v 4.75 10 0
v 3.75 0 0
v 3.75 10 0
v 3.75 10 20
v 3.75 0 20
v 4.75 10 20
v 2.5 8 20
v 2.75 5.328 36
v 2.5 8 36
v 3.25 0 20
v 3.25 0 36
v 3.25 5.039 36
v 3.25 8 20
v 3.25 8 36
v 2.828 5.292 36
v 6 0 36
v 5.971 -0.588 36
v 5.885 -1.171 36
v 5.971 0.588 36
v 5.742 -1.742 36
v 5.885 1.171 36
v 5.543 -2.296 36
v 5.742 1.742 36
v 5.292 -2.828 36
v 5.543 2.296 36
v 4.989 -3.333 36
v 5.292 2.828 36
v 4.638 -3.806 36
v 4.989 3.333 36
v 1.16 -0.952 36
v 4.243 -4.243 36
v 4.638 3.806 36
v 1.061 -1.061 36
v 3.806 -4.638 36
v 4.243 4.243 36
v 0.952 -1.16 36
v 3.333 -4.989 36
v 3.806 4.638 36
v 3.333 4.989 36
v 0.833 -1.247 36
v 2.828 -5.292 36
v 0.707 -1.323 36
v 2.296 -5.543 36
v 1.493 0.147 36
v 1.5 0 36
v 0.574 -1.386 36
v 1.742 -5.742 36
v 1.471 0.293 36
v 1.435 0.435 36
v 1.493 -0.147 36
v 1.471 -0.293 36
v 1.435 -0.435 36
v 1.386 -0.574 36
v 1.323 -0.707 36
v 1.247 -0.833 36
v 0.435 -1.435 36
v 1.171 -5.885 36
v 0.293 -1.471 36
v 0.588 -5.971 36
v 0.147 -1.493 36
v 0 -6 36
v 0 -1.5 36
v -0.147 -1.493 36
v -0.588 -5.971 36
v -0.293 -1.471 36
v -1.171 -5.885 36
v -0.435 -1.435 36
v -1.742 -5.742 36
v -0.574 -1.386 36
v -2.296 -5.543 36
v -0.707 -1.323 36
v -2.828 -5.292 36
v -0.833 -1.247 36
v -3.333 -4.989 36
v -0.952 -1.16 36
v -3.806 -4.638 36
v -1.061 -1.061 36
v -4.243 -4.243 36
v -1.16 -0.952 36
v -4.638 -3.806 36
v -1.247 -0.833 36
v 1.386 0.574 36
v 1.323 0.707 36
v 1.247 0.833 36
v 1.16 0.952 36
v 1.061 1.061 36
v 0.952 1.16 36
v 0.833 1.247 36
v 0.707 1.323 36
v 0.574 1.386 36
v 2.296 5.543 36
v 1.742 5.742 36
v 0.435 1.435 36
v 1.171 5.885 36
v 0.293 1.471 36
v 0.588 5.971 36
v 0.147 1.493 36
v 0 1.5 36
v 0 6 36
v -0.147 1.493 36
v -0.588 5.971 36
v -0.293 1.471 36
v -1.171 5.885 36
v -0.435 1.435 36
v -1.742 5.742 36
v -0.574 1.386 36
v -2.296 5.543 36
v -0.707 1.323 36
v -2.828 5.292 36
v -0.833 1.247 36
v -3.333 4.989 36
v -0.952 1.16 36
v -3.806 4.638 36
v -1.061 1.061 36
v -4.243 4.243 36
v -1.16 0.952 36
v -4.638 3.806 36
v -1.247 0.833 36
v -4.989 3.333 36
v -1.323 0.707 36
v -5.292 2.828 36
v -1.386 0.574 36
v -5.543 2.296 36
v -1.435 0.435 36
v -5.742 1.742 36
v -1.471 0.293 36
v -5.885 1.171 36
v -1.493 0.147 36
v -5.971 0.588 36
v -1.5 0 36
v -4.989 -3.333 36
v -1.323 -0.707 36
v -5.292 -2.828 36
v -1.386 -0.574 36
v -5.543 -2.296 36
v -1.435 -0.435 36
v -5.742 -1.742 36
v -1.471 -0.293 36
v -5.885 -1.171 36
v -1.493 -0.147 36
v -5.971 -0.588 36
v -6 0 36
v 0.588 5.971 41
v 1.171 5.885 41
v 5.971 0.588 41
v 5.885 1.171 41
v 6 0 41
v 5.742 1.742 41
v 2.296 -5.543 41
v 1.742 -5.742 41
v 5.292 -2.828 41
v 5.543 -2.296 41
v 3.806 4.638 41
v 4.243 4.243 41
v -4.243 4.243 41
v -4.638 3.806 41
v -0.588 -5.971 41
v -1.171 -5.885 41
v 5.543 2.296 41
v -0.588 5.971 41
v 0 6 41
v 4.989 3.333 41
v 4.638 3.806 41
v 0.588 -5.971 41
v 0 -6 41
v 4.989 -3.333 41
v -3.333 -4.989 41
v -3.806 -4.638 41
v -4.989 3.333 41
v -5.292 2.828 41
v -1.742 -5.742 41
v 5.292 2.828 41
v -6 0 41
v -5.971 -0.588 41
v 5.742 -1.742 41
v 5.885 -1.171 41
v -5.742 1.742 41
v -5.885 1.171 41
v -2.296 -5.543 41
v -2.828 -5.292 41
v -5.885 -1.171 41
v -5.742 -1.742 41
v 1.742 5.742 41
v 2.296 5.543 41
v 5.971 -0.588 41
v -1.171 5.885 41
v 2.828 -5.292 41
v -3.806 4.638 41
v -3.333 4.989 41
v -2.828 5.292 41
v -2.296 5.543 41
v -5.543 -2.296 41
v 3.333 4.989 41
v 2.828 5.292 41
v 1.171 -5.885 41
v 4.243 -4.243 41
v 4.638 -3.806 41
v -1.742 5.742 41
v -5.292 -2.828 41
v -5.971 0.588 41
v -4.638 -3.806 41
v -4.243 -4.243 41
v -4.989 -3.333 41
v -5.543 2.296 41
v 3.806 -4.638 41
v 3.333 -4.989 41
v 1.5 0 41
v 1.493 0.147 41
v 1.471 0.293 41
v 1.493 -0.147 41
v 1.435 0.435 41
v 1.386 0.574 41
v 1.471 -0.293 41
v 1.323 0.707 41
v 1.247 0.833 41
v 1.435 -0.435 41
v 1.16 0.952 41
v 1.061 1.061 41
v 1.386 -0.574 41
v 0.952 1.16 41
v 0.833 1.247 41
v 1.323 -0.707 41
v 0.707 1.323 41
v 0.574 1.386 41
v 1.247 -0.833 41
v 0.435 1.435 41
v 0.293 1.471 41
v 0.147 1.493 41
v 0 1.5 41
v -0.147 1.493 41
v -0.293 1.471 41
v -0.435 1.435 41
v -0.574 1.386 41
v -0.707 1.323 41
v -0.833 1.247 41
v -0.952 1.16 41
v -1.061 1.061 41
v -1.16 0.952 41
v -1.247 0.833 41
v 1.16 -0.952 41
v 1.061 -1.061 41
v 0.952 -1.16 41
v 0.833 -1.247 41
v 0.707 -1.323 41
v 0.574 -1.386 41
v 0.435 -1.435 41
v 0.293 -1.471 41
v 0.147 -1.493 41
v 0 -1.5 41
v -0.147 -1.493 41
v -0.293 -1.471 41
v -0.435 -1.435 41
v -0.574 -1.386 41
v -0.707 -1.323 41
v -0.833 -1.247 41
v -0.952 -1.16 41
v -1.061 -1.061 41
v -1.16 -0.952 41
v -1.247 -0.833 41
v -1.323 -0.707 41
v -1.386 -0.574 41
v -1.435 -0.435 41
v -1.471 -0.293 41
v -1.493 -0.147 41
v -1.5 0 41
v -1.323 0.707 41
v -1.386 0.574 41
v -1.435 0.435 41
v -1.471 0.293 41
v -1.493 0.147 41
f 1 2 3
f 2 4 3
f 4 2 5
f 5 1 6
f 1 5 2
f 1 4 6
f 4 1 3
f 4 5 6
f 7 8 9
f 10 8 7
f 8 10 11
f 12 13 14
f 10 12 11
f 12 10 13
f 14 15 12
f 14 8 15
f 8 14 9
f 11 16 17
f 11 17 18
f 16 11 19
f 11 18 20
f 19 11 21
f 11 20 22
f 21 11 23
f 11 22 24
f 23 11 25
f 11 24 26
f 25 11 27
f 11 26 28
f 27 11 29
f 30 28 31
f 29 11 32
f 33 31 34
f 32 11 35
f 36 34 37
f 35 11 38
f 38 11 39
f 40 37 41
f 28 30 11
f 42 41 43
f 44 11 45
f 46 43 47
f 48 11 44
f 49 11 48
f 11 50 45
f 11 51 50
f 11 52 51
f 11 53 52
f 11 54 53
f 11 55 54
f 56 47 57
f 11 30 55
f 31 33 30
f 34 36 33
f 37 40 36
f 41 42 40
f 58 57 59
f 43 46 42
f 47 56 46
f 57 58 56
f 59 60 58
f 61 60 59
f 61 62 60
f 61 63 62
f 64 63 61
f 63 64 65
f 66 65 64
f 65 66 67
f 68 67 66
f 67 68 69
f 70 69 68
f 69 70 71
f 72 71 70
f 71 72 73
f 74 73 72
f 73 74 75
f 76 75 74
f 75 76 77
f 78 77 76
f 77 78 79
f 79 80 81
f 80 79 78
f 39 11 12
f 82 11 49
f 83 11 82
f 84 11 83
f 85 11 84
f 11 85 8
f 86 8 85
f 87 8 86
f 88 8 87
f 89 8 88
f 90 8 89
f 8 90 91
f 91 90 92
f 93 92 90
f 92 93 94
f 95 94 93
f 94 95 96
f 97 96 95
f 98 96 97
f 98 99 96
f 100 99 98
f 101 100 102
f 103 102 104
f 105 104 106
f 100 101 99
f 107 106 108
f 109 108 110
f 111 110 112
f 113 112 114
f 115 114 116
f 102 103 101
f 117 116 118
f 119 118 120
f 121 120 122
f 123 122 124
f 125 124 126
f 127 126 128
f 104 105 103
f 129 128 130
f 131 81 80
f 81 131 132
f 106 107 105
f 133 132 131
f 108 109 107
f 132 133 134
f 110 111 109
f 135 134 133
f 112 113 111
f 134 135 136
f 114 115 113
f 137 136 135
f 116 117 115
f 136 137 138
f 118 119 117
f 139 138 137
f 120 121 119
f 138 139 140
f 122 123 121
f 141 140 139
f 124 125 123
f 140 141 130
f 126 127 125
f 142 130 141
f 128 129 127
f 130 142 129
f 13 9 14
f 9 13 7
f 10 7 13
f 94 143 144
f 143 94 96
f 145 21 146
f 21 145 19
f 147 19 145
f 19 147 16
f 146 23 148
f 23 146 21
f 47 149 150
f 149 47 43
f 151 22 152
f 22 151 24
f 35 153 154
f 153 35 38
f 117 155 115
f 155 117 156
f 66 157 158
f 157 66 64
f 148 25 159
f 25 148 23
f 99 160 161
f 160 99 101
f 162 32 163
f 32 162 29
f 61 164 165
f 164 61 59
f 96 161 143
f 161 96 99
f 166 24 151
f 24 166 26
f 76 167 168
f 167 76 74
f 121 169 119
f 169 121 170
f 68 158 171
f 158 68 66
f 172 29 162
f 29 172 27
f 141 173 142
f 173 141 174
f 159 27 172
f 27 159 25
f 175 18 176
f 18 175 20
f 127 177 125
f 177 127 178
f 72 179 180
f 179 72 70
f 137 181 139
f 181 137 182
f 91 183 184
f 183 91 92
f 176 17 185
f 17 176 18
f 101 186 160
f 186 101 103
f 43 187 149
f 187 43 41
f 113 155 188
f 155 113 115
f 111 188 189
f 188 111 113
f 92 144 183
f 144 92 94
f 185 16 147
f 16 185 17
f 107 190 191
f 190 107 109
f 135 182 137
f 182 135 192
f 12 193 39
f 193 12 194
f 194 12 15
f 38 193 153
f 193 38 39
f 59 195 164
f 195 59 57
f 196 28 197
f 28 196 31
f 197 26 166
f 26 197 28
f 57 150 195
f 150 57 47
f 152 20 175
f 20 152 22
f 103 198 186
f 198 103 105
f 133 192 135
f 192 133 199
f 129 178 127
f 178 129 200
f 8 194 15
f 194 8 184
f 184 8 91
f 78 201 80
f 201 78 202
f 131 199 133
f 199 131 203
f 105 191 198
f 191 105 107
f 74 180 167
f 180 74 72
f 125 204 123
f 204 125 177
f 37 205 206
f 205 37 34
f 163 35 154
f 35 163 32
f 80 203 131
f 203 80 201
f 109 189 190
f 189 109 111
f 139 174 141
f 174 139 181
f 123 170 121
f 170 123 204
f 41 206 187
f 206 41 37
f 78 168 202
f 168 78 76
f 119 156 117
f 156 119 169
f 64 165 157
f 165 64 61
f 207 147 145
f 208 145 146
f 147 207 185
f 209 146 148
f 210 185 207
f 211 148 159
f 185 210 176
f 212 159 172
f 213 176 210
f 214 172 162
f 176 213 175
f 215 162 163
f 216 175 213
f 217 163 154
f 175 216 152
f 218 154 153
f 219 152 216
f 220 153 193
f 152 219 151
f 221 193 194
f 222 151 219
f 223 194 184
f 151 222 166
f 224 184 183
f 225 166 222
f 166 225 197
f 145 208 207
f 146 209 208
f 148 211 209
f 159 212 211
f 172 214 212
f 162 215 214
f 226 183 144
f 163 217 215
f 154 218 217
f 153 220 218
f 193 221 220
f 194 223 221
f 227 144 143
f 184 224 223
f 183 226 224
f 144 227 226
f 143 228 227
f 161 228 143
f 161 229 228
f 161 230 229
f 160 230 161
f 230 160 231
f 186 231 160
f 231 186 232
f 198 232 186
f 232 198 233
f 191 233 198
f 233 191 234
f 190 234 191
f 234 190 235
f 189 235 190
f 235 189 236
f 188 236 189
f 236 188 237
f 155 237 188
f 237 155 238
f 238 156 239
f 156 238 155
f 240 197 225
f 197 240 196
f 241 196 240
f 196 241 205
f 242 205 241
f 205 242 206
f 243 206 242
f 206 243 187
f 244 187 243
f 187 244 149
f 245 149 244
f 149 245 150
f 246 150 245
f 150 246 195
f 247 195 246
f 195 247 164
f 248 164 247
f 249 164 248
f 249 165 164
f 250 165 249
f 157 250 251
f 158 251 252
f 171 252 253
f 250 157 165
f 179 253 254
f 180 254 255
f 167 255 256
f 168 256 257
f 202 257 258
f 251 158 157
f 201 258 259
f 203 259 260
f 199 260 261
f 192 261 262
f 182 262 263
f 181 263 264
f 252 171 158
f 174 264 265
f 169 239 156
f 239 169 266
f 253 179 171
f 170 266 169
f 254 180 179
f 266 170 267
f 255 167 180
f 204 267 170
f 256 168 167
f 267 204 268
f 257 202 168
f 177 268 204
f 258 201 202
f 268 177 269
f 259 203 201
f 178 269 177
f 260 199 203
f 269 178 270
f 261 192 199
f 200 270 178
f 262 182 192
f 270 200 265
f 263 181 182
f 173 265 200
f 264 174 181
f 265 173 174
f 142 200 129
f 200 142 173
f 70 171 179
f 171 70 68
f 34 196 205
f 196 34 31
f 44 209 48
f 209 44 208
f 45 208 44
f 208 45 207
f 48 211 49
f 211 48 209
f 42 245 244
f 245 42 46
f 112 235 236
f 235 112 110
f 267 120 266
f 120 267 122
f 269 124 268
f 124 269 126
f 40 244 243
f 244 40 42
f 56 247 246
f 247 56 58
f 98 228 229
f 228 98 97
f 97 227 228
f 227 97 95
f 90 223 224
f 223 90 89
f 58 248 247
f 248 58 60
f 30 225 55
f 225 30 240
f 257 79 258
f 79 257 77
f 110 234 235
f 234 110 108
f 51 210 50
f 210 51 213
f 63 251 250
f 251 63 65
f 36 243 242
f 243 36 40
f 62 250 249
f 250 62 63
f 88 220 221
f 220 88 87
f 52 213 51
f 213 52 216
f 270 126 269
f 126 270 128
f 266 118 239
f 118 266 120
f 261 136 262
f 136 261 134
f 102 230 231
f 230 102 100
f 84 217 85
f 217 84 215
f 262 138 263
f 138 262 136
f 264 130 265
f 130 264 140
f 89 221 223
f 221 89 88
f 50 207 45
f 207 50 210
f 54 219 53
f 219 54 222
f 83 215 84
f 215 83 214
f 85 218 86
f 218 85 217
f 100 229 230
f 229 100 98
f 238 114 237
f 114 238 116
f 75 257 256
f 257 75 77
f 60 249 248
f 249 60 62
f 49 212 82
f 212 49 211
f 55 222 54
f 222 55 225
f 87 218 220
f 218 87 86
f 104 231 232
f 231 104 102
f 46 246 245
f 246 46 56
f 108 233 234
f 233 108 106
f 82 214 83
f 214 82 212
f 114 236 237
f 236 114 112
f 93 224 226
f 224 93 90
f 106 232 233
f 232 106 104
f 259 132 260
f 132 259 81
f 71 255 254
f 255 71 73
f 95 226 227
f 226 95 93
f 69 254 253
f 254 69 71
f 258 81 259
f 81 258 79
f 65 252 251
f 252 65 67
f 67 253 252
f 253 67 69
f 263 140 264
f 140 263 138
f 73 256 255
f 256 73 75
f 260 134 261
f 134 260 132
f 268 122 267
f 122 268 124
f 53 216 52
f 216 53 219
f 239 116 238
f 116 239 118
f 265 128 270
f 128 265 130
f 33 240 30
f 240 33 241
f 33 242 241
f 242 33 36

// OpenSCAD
// Hose-barb reducer: 8 mm ID -> 5 mm ID
// Print orientation: standing upright along +Z

$fn = 64;

// ---- Dimensions (mm) ----
tube_id_8     = 8;    // 8 mm tubing inner diameter
tube_id_5     = 5;    // 5 mm tubing inner diameter
bore          = 3;    // through-bore diameter
barb_h_8      = 10;   // 8 mm tubing barb height
barb_od_8_bot = 7.5;  // 8 mm barb outer diameter at bottom
barb_od_8_top = 9.5;  // 8 mm barb outer diameter at top
step_8        = 7.5;  // 8 mm barb outer diameter after step back
collar_h      = 5;    // collar height (z = 20 to 25)
collar_d      = 12;   // collar diameter
barb_h_5      = 8;    // 5 mm tubing barb height
barb_od_5_bot = 6.5;  // 5 mm barb outer diameter at bottom
barb_od_5_top = 5.0;  // 5 mm barb outer diameter at top
step_5        = 6.5;  // 5 mm barb outer diameter after step back
total_h       = 41;   // top of last 5 mm barb

eps = 0.5;            // cutter overshoot

// ---- Model ----
difference() {
    union() {
        // 8 mm barbs: z = 0 to 20
        for (i = [0 : 1])
            translate([0, 0, i * barb_h_8])
                linear_extrude(height = barb_h_8)
                    polygon([
                        [barb_od_8_bot / 2, 0],
                        [barb_od_8_top / 2, barb_h_8],
                        [step_8 / 2,        barb_h_8]
                    ]);
        // collar: z = 20 to 25
        translate([0, 0, total_h - collar_h])
            cylinder(h = collar_h, d = collar_d);
        // 5 mm barbs: z = 25 to 41
        for (i = [0 : 1])
            translate([0, 0, total_h - collar_h - (i + 1) * barb_h_5])
                linear_extrude(height = barb_h_5)
                    polygon([
                        [barb_od_5_bot / 2, 0],
                        [barb_od_5_top / 2, barb_h_5],
                        [step_5 / 2,        barb_h_5]
                    ]);
    }
    // through-bore
    translate([0, 0, -eps])
        cylinder(h = total_h + 2 * eps, d = bore);
}
